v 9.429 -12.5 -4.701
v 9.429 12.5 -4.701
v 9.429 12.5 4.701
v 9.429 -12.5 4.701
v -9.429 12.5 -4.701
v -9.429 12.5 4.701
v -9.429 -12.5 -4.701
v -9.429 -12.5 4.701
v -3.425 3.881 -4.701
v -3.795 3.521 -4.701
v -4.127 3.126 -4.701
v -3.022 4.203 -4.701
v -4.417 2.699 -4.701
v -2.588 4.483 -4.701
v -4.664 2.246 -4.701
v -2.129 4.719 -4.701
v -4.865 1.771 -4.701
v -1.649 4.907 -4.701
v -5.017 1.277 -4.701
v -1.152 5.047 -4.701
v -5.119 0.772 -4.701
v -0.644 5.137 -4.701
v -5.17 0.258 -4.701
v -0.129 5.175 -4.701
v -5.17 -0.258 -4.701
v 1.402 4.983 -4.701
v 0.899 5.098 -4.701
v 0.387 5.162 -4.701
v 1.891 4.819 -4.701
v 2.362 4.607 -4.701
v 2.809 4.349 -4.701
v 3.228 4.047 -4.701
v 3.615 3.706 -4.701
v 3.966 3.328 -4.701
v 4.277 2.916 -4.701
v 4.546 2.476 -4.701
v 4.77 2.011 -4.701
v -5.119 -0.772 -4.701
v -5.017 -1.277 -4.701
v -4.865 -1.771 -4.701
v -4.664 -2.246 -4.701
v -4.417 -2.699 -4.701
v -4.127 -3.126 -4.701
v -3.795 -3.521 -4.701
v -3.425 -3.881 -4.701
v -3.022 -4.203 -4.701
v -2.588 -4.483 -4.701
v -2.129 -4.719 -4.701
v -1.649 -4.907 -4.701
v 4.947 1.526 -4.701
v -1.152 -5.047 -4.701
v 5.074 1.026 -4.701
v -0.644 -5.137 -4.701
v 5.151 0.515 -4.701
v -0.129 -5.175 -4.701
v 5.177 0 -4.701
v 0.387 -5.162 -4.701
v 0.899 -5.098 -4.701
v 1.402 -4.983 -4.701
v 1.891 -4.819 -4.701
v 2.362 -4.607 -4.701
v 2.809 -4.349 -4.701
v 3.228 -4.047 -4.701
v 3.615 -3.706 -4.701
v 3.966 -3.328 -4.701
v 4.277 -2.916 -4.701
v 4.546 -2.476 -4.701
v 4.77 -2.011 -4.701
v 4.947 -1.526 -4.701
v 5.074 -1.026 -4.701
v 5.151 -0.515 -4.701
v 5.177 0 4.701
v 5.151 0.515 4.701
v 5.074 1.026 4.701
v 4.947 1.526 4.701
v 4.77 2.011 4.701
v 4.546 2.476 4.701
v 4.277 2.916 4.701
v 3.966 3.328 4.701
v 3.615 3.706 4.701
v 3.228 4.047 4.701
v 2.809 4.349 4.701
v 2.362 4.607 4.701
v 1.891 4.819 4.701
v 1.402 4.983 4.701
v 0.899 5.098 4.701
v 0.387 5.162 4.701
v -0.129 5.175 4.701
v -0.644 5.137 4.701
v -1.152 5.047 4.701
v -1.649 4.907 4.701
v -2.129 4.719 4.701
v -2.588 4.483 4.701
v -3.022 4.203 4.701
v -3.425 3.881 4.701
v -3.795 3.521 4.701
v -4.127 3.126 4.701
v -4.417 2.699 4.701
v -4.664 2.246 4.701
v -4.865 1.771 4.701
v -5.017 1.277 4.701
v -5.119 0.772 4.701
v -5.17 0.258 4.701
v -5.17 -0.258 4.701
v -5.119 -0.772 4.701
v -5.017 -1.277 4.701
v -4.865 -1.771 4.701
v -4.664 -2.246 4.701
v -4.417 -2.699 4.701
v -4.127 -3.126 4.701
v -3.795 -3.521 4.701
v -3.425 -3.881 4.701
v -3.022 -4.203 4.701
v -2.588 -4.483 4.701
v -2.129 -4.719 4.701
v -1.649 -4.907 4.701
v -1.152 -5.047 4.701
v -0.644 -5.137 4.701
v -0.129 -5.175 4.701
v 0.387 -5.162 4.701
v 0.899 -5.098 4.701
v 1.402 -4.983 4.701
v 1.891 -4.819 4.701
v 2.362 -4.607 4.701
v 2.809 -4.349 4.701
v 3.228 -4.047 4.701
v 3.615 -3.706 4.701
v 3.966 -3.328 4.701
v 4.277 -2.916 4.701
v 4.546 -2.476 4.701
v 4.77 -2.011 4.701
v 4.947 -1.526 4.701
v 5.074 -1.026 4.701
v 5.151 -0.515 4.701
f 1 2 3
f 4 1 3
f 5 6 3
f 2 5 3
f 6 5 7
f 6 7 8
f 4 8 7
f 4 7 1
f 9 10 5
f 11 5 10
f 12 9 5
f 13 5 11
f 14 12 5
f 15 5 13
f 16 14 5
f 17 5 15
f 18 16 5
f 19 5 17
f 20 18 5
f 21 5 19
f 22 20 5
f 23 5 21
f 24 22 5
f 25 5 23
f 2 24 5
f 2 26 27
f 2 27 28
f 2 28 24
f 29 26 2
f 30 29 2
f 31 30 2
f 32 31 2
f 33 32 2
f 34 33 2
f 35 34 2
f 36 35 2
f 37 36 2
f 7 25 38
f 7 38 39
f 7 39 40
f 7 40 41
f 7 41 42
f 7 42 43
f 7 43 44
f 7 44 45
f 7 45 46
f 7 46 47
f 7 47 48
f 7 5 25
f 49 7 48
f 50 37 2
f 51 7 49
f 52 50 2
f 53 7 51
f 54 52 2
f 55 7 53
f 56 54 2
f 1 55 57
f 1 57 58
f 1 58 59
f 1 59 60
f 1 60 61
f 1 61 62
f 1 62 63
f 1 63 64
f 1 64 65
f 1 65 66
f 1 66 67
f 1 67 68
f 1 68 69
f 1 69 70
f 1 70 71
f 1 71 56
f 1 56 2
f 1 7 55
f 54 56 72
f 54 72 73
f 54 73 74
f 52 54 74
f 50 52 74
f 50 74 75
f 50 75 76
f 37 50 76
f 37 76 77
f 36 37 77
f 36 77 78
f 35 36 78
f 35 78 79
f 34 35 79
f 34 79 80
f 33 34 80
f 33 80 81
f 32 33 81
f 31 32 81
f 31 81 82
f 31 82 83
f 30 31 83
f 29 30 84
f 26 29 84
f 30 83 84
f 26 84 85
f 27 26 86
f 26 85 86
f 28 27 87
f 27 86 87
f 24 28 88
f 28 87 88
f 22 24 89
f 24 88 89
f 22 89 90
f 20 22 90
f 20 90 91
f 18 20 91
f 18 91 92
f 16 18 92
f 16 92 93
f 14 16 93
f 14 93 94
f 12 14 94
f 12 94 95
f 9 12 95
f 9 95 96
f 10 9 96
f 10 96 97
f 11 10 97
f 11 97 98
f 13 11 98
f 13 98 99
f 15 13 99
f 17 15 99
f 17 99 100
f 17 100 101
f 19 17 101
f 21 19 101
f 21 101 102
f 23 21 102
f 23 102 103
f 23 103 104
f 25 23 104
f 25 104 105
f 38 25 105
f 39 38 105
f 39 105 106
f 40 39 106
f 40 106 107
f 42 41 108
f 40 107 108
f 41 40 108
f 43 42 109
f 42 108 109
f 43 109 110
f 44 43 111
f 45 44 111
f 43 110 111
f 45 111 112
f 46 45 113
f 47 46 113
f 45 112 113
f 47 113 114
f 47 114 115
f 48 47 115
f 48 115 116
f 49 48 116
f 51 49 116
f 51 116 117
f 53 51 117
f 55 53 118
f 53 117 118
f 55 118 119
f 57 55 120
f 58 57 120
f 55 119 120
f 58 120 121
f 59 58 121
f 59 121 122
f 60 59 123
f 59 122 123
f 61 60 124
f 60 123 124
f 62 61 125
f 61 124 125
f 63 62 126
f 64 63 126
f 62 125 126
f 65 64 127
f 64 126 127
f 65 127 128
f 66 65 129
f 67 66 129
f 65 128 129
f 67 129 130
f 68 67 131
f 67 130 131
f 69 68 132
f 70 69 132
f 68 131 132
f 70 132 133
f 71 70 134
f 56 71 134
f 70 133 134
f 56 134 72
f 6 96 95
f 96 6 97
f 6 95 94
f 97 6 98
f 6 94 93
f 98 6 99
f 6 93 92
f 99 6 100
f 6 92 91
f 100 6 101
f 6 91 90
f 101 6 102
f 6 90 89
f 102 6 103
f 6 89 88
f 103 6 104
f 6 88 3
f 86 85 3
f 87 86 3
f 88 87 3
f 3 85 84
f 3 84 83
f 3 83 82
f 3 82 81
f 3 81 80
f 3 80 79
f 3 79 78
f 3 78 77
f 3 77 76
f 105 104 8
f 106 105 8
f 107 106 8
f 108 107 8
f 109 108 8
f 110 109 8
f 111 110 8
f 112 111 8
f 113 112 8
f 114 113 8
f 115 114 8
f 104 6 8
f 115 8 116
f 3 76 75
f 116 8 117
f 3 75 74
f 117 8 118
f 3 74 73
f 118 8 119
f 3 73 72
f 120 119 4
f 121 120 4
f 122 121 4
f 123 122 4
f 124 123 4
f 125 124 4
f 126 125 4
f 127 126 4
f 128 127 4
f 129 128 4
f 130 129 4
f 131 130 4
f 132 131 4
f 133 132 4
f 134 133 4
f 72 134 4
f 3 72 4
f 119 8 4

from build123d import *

# Parameters (mm, degrees)
F0_W     = 18.8587028533
F0_H     = 9.4020338729
F1_DEPTH = 12.5
F2_R     = 5.1767234365
F3_DEPTH = 25


with BuildPart() as f1:
    # F0 (on Front) → F1 (new body, symmetric)
    with BuildSketch(Plane.XZ):
        Rectangle(F0_W, F0_H)
    extrude(amount=F1_DEPTH, both=True)

    # F2 (on face) → F3 (cut)
    with BuildSketch(Plane.XY.offset(4.7010169365)):
        Circle(F2_R)
    extrude(amount=-F3_DEPTH, mode=Mode.SUBTRACT)


solid = f1.part
